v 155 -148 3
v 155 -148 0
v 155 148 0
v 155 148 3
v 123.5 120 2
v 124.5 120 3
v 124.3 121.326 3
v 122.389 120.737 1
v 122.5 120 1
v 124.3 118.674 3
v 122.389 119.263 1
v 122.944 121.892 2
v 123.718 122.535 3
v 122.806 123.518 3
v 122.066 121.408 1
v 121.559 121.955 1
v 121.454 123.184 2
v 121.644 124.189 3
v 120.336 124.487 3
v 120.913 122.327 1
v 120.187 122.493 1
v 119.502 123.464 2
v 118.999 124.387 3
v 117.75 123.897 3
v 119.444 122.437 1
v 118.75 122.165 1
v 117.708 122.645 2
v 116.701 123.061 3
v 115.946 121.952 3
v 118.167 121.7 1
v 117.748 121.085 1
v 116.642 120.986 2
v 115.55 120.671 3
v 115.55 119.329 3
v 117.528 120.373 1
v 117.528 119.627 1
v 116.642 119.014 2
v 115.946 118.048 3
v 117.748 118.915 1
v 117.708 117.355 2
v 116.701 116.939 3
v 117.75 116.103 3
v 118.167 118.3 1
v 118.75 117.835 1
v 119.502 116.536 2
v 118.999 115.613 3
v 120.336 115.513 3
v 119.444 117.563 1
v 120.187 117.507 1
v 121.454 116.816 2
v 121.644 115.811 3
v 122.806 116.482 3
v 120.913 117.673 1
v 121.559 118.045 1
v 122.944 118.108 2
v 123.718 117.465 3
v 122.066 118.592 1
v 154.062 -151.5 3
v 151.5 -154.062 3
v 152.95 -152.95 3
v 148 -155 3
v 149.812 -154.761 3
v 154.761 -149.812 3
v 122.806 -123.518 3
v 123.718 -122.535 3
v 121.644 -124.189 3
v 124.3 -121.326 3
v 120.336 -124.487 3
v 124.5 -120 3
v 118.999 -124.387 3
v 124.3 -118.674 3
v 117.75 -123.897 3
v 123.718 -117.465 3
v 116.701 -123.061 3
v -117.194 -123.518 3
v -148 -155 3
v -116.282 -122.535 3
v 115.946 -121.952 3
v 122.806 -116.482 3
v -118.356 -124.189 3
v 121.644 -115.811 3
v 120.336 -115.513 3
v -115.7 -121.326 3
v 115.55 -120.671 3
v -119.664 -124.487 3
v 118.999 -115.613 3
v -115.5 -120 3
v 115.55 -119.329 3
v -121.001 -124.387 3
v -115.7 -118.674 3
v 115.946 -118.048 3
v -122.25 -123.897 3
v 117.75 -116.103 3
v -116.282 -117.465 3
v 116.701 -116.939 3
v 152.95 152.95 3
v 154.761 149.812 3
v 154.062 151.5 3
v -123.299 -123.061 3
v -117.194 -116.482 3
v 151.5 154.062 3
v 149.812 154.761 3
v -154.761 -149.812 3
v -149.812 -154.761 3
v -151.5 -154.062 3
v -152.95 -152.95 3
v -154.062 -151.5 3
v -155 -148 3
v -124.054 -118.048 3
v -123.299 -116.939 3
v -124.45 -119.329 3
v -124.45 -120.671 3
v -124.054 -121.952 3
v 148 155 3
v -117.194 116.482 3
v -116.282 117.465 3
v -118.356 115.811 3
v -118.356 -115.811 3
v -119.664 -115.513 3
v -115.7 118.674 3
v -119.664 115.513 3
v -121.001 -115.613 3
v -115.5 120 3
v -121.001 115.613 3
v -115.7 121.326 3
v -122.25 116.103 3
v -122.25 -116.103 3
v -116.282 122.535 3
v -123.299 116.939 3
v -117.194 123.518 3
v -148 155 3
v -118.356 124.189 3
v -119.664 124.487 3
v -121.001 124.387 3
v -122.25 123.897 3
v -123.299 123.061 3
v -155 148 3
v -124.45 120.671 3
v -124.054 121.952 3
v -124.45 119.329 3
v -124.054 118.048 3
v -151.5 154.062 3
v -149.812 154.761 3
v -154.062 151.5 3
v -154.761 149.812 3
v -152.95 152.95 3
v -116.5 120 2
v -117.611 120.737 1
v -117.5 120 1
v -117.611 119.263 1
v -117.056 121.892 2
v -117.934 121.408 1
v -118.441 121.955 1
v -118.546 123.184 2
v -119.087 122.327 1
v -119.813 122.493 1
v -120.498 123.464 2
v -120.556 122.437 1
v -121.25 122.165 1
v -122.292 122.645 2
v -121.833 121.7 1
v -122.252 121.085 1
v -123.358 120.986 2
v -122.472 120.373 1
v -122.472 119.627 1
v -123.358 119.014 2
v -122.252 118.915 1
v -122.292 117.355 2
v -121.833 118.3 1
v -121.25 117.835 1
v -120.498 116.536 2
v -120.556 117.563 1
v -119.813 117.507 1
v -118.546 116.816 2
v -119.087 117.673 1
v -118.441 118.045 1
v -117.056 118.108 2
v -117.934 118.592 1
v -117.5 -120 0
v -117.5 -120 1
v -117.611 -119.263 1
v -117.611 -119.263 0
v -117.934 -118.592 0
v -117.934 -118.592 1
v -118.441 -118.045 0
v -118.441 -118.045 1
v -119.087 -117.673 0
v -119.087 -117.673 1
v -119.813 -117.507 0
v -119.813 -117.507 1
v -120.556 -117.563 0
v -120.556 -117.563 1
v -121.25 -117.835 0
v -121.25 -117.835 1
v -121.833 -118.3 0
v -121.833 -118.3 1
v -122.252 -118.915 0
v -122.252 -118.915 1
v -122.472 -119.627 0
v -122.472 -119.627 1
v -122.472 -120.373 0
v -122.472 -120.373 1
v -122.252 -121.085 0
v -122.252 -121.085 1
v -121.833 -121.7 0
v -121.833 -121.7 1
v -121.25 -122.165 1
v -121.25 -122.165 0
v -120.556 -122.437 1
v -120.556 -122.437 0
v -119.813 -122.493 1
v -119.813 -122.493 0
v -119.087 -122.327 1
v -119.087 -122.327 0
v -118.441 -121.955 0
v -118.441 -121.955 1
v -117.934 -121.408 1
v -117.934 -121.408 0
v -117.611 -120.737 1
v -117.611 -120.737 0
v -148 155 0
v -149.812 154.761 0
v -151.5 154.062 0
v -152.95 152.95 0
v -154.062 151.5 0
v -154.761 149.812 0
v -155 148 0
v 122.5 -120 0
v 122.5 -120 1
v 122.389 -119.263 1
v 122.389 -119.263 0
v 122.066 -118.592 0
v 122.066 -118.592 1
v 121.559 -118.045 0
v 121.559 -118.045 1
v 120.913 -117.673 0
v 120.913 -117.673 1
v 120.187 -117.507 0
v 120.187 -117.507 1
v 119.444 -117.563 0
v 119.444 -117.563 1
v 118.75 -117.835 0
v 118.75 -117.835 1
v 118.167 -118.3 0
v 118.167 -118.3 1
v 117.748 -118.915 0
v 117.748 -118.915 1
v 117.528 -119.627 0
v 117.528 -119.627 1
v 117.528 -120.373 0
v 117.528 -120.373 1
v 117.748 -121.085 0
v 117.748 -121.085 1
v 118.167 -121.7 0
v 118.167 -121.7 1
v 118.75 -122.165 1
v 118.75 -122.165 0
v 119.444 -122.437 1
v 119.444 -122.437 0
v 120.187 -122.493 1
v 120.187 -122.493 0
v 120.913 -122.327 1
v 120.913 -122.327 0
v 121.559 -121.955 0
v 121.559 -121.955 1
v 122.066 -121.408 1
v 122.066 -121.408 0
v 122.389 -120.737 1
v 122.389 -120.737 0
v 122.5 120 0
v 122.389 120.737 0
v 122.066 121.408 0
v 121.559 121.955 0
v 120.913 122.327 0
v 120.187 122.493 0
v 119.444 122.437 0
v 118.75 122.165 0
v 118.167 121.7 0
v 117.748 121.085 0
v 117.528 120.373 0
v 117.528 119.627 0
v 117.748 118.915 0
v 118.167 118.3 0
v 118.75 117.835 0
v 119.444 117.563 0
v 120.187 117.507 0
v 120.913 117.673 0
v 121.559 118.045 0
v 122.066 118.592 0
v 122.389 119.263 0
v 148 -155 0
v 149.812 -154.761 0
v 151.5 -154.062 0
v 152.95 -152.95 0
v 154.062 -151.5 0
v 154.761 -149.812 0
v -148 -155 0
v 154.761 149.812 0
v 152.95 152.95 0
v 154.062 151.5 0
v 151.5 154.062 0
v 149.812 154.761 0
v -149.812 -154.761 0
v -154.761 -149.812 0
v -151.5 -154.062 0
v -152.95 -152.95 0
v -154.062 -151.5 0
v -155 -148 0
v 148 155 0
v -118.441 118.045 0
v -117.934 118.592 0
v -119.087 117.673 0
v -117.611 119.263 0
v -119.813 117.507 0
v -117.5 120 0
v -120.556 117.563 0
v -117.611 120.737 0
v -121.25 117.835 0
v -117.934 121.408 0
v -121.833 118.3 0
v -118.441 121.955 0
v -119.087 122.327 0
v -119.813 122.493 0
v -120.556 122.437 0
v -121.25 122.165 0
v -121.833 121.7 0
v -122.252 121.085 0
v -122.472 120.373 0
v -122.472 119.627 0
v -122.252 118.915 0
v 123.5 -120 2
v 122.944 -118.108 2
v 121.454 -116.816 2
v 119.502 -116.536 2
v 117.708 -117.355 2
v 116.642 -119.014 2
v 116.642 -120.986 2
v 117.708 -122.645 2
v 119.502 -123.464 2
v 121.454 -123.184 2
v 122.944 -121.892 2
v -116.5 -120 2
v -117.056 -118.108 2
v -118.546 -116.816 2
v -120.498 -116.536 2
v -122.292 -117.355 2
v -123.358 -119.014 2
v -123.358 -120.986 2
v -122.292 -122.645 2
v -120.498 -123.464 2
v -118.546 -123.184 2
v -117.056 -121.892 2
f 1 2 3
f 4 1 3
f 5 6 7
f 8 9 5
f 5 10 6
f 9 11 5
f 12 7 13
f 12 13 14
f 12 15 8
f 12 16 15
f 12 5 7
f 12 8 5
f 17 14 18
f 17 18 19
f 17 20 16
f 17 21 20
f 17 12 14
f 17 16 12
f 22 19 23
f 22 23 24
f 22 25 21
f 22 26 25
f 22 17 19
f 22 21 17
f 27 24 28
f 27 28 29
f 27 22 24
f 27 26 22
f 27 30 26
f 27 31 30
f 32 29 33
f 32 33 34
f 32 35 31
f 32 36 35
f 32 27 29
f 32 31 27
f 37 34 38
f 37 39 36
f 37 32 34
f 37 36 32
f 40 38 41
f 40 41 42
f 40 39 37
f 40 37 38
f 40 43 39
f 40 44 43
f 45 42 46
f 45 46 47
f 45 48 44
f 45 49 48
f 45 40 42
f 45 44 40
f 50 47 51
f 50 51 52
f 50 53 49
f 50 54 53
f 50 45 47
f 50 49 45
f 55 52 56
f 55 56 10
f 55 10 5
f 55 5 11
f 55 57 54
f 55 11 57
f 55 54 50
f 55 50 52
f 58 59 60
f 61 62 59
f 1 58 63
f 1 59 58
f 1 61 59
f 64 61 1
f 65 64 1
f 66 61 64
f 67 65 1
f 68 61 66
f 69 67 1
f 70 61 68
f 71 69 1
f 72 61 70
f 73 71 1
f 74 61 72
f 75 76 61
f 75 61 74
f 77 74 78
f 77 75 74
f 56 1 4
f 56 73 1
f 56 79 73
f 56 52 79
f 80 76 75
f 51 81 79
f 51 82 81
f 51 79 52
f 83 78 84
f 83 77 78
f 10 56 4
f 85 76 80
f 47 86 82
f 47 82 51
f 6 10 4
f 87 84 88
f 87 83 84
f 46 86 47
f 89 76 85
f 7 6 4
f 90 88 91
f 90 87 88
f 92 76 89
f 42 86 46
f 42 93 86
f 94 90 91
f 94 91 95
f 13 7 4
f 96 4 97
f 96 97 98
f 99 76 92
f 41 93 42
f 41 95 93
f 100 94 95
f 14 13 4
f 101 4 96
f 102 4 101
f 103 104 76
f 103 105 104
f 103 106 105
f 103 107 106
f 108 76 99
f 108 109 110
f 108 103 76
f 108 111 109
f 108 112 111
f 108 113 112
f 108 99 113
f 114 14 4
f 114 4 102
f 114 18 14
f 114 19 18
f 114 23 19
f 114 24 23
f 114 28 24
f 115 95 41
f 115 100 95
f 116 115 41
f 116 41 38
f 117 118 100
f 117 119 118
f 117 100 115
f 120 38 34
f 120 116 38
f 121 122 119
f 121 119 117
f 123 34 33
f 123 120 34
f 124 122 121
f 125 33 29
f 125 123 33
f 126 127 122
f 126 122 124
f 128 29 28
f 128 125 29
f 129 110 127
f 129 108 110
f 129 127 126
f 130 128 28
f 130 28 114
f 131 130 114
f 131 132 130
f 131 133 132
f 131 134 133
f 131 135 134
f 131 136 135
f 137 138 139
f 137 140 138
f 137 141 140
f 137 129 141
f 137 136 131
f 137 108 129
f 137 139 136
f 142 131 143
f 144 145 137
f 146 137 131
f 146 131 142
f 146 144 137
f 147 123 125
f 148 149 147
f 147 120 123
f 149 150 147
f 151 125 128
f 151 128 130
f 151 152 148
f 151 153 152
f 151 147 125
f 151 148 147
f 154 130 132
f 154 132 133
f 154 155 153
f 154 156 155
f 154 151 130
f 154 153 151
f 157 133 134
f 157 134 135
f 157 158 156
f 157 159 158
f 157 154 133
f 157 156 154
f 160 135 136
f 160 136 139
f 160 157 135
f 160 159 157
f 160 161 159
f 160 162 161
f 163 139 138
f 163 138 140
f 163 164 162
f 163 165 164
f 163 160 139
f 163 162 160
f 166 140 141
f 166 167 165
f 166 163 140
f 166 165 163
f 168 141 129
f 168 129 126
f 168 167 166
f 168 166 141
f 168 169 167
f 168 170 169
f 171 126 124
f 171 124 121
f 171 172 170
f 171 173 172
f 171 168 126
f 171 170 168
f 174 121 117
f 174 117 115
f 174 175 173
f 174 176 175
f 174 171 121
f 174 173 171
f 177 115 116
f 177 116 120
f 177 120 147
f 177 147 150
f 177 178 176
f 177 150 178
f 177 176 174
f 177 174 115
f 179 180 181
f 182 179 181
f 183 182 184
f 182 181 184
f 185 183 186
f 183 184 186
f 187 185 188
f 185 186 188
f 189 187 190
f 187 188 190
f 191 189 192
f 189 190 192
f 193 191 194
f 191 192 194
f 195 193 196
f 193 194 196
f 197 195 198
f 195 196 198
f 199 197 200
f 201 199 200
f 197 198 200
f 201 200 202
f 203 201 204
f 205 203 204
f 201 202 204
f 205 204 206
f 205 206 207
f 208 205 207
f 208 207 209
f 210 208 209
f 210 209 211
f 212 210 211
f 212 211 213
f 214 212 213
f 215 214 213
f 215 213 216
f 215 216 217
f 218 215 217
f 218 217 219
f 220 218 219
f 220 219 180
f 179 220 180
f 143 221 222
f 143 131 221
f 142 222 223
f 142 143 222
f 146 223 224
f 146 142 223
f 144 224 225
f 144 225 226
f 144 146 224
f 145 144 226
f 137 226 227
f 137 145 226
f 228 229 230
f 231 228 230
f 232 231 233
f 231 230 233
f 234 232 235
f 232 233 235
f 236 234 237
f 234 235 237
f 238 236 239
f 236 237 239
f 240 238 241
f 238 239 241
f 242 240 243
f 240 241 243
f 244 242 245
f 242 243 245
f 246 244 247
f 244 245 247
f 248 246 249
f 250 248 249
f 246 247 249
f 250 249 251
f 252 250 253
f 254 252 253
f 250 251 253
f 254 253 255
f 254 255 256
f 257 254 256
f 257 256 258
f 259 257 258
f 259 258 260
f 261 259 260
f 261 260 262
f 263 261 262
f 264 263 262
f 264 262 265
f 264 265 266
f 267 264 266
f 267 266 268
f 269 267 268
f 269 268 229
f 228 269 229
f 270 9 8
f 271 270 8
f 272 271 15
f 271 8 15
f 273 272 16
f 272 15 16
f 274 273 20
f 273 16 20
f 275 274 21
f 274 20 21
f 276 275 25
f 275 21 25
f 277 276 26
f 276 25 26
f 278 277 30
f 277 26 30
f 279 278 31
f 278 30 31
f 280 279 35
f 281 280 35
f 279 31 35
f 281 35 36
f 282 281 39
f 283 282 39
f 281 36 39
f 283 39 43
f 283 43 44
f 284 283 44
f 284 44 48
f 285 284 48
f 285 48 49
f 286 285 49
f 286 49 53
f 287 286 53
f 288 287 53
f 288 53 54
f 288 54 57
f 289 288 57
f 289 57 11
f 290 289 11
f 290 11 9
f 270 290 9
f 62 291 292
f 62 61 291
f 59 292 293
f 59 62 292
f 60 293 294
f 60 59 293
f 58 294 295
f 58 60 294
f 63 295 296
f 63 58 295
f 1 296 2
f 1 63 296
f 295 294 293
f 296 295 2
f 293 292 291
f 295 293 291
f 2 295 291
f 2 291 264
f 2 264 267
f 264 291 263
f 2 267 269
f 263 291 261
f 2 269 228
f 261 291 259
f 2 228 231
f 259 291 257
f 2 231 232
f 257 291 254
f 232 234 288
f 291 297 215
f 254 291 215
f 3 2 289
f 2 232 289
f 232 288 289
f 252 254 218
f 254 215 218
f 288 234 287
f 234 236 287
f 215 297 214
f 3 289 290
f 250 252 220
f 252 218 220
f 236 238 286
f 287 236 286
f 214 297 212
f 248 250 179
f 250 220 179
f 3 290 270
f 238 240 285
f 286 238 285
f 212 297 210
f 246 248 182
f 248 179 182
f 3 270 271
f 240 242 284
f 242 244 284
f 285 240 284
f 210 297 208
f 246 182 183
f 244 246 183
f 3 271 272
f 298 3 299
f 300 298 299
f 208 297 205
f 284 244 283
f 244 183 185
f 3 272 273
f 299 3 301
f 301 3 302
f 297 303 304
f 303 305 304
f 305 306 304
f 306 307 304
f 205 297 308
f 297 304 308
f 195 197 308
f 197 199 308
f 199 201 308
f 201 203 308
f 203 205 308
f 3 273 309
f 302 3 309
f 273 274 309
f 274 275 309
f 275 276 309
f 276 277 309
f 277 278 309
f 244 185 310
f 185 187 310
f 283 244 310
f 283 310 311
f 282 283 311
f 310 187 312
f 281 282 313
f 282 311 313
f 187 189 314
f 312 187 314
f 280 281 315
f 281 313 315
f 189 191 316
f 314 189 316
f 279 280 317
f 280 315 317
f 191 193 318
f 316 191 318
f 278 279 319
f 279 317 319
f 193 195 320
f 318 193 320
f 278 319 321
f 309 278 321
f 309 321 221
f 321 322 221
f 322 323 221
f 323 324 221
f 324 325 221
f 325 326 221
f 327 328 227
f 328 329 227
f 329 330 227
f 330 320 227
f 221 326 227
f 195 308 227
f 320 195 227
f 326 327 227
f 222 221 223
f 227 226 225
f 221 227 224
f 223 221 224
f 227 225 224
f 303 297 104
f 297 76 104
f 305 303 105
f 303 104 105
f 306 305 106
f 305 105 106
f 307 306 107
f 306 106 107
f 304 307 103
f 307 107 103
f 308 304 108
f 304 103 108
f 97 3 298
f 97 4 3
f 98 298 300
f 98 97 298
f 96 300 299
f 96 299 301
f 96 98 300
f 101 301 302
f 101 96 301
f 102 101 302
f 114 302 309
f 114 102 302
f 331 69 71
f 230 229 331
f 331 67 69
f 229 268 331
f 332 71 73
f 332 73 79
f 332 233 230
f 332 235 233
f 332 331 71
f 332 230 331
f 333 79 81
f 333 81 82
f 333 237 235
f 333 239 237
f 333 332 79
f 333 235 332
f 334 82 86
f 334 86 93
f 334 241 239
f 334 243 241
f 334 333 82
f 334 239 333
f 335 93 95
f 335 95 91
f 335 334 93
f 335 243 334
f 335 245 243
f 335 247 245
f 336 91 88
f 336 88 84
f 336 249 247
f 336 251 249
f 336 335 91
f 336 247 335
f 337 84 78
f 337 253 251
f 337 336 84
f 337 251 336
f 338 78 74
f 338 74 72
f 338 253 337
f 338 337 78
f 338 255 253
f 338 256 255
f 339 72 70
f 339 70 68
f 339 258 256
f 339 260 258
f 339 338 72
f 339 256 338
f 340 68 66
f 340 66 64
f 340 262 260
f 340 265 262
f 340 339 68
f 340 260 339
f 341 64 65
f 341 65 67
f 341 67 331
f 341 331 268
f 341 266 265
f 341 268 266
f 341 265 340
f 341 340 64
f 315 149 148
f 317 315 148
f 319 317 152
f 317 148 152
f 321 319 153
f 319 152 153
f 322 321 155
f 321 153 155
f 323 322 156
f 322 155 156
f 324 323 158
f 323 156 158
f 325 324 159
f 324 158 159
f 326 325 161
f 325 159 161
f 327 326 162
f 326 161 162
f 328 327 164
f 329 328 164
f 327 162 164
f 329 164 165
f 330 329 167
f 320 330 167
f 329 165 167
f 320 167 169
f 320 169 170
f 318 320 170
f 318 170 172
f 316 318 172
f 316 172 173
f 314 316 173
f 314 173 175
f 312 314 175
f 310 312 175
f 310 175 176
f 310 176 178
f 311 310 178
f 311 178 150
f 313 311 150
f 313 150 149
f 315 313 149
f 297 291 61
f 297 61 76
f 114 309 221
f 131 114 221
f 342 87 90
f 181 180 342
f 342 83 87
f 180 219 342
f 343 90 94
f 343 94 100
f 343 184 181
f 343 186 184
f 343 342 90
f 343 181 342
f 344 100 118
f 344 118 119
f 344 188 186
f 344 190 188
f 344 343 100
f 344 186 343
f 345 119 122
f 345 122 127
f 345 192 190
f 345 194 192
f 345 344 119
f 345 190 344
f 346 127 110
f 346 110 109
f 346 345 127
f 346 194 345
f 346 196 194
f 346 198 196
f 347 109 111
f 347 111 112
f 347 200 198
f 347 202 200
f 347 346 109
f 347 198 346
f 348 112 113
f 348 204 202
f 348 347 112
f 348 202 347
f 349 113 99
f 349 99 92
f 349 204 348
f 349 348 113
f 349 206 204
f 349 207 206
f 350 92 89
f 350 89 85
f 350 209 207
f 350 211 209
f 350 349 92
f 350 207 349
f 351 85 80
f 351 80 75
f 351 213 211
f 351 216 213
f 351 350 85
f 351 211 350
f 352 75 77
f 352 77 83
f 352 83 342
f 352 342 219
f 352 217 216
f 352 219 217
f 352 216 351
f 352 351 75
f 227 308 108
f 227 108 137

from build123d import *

# Parameters (mm, degrees)
SKETCH1_W           = 310
SKETCH1_H           = 310
BOSS_EXTRUDE1_DEPTH = 3
FILLET1_R           = 7
SKETCH2_R           = 2.5
CUT_EXTRUDE1_DEPTH  = 220.223630113
CHAMFER1_SIZE       = 2


with BuildPart() as part:
    # Sketch1 → Boss-Extrude1 (new body)
    with BuildSketch(Plane(origin=(0, 0, 0), x_dir=(0, 1, 0), z_dir=(0, 0, 1))):
        Rectangle(SKETCH1_W, SKETCH1_H)
    extrude(amount=BOSS_EXTRUDE1_DEPTH)

    # Fillet1
    fillet1_edges = [part.edges().sort_by_distance(p)[0] for p in [
        (155, 155, 1.5),
        (155, -155, 1.5),
        (-155, -155, 1.5),
        (-155, 155, 1.5),
    ]]
    fillet(fillet1_edges, radius=FILLET1_R)

    # Sketch2 → Cut-Extrude1 (cut, through all)
    with BuildSketch(Plane.XY.offset(3)):
        with Locations((-120, 120)):
            Circle(SKETCH2_R)
        with Locations((120, 120)):
            Circle(SKETCH2_R)
        with Locations((120, -120)):
            Circle(SKETCH2_R)
        with Locations((-120, -120)):
            Circle(SKETCH2_R)
    extrude(amount=-CUT_EXTRUDE1_DEPTH, mode=Mode.SUBTRACT)

    # Chamfer1
    chamfer1_edges = [part.edges().sort_by_distance(p)[0] for p in [
        (-122.5, -120, 3),
        (117.5, -120, 3),
        (117.5, 120, 3),
        (-122.5, 120, 3),
    ]]
    chamfer(chamfer1_edges, length=CHAMFER1_SIZE)


solid = part.part
